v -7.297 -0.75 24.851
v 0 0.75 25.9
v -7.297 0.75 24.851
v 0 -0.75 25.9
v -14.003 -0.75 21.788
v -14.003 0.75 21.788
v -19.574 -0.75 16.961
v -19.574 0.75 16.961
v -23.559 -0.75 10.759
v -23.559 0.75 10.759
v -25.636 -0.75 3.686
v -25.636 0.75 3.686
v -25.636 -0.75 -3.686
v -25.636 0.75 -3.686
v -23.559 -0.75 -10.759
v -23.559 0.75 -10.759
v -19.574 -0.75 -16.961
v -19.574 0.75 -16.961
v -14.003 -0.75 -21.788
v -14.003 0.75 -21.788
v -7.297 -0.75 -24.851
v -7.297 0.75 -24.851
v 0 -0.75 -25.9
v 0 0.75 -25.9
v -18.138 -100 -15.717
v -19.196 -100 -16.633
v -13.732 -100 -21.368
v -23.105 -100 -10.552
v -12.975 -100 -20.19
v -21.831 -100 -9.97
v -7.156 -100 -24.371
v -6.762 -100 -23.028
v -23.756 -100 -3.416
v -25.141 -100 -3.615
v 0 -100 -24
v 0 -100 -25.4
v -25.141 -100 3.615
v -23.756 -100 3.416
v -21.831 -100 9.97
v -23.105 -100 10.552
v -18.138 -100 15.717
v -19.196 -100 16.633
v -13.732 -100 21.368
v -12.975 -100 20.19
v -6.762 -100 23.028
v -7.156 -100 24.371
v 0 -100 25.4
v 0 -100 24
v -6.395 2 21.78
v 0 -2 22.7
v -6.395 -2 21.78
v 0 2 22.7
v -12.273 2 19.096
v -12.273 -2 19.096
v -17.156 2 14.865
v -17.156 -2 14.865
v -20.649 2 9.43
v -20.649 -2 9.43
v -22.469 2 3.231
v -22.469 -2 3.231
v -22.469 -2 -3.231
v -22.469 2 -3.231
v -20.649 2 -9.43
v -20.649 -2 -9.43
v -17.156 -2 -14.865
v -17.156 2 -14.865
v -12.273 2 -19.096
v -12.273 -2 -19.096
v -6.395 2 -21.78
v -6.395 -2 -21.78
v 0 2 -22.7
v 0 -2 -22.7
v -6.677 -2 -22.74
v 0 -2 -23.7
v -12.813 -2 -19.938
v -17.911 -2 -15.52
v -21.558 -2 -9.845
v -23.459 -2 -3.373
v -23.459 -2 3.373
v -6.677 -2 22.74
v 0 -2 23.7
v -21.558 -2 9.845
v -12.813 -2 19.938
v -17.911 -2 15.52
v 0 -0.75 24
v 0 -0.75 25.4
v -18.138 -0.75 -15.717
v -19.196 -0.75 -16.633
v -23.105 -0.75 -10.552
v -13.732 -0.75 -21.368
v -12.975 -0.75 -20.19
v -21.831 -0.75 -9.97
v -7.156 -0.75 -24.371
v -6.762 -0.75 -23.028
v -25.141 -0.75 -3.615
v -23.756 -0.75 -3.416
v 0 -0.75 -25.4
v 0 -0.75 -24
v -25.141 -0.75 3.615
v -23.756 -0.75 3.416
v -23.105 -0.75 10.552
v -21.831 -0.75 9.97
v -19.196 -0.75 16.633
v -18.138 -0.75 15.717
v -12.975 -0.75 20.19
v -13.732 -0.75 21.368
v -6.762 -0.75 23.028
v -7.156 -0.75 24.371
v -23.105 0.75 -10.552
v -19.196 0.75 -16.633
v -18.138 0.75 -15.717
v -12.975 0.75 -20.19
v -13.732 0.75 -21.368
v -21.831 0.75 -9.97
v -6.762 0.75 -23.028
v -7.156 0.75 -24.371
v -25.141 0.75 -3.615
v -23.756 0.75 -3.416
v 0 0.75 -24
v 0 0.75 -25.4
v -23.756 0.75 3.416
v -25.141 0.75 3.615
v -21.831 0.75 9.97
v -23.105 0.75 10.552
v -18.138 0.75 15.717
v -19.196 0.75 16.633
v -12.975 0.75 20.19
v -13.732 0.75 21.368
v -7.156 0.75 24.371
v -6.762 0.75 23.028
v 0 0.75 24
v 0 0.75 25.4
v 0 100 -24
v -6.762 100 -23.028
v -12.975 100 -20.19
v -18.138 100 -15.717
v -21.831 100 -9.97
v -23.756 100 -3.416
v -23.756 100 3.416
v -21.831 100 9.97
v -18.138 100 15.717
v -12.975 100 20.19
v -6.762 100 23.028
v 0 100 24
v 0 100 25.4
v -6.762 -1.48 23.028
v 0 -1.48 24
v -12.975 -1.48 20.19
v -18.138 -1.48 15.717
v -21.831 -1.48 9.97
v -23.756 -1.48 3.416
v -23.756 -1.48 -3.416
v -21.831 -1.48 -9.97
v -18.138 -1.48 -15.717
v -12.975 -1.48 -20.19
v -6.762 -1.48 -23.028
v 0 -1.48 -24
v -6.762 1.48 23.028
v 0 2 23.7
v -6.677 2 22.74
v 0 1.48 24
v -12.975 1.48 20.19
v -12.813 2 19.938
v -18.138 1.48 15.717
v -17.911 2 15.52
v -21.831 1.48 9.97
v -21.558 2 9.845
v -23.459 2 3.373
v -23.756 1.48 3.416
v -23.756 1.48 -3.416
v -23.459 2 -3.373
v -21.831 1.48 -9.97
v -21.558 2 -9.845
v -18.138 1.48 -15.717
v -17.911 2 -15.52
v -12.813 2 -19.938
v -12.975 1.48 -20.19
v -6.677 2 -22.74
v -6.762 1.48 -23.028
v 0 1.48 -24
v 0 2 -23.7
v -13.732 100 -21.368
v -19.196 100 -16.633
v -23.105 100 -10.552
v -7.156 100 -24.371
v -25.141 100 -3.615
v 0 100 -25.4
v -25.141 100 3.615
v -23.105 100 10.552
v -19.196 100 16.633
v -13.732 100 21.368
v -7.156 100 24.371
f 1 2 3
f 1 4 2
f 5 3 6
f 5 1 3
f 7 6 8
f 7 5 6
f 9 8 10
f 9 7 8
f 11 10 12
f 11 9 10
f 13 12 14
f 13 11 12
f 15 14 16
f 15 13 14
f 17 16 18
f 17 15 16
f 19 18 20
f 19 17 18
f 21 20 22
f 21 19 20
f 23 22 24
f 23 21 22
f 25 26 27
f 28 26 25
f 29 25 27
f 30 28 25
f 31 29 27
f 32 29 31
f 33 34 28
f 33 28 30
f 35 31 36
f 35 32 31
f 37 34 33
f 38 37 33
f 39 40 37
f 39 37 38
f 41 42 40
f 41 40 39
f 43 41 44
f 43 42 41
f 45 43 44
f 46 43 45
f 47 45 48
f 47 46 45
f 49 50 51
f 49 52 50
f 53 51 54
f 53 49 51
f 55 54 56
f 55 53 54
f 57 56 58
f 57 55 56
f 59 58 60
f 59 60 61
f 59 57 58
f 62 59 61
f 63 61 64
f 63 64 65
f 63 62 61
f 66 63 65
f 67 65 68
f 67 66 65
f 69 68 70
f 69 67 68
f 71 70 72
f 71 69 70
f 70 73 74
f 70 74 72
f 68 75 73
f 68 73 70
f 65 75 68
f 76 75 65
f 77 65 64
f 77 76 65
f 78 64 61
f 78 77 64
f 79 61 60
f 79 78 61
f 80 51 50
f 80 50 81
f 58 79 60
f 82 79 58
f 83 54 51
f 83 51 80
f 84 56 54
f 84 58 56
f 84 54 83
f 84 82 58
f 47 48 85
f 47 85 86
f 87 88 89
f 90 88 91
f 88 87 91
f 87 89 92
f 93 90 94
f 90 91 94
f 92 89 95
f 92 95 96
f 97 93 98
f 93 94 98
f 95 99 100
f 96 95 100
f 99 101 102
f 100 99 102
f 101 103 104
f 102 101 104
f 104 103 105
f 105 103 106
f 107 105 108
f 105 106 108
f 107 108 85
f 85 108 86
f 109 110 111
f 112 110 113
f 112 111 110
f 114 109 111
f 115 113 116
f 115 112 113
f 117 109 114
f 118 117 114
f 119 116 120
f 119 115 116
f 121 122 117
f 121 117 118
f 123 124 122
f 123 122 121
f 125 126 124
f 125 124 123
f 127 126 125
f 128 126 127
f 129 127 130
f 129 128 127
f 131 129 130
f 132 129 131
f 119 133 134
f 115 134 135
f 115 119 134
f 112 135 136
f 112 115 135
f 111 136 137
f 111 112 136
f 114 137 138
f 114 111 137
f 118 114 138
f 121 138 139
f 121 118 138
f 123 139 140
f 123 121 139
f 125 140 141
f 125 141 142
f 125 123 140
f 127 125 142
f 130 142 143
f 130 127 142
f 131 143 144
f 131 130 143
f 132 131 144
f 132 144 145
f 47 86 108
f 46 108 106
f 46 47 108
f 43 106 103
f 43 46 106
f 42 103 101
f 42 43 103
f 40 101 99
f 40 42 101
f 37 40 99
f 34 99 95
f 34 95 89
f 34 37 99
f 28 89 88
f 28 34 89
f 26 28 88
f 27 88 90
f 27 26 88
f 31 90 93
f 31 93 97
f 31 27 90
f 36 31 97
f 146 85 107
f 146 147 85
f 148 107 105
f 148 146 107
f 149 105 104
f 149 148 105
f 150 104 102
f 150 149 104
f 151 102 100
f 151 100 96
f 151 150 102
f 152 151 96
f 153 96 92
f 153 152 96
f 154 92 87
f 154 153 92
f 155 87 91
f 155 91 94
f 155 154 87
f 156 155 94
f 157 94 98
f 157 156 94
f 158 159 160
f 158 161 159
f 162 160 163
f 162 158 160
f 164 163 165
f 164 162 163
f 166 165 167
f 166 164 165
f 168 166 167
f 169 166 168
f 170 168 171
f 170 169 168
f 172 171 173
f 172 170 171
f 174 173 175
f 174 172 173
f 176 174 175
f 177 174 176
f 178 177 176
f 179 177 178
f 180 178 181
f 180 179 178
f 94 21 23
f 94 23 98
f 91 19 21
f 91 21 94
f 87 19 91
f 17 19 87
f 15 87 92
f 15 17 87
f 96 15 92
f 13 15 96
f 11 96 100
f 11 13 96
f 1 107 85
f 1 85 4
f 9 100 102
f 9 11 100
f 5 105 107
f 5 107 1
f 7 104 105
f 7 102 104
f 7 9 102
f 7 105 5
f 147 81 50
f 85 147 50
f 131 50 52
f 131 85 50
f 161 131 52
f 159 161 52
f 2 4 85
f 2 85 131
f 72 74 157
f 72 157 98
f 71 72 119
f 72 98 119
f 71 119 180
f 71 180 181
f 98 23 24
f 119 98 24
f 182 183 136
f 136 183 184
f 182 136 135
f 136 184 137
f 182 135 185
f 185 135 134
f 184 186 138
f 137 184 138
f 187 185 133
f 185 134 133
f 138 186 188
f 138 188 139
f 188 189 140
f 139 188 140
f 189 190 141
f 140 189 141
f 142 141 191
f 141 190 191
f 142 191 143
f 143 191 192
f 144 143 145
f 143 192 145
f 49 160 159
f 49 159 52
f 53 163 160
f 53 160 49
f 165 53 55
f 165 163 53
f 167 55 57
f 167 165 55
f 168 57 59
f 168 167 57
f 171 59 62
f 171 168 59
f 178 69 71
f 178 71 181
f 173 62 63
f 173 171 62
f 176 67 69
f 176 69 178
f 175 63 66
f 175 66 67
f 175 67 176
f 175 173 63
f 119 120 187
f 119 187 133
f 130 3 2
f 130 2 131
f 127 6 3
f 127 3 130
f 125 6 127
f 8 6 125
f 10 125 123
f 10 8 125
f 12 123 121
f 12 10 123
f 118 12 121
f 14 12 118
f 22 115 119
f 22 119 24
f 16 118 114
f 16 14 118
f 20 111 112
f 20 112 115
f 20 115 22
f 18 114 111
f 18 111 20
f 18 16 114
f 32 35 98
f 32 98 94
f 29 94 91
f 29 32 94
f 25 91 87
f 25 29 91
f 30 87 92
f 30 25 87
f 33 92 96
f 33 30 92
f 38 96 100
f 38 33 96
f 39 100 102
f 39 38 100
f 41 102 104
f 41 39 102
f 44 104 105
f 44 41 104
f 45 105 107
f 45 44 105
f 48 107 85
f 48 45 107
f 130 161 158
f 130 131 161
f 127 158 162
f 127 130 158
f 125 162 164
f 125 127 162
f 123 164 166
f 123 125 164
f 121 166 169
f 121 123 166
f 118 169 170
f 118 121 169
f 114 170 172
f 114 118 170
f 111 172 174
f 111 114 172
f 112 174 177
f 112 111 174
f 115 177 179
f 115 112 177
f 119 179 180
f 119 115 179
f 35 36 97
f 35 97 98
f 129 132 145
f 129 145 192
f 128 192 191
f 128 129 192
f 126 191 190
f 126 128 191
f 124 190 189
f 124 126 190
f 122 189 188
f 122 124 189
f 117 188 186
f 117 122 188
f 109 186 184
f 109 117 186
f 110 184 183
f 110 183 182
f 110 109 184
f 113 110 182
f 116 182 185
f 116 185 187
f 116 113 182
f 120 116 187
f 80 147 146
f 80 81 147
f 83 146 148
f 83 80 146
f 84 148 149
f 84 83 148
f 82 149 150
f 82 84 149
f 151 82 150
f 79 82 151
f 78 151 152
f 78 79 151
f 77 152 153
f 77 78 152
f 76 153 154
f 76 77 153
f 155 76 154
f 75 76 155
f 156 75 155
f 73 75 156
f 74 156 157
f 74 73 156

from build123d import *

# Parameters (mm, degrees)
F1_DEPTH = 100
F2_R     = 25.4
F3_DEPTH = 0.75
F5_ANGLE = 180


with BuildPart() as f1:
    # F0 (on Front) → F1 (new body, symmetric)
    with BuildSketch(Plane.XZ):
        with BuildLine():
            Line((0, 24), (0, 25.4))
            ThreePointArc((0, 25.4), (-25.4, 0), (0, -25.4))
            Line((0, -25.4), (0, -24))
            ThreePointArc((0, -24), (-24, 0), (0, 24))
        make_face()
    extrude(amount=F1_DEPTH, both=True)

    # F2 (on Front) → F3 (cut, symmetric)
    with BuildSketch(Plane.XZ):
        Circle(F2_R)
    extrude(amount=F3_DEPTH, both=True, mode=Mode.SUBTRACT)


with BuildPart() as f5:
    # F4 (on Right) → F5 (revolve)
    with BuildSketch(Plane.YZ):
        Polygon((0.75, 25.9), (-0.75, 25.9), (-0.75, 24), (-1.4803847577, 24), (-2, 23.7), (-2, 22.7), (2, 22.7), (2, 23.7), (1.4803847577, 24), (0.75, 24), (0.75, 25.4), align=None)
    revolve(axis=Axis((0, 0, 0), (0, -1, 0)), revolution_arc=F5_ANGLE)


solid = Compound([f1.part, f5.part])
